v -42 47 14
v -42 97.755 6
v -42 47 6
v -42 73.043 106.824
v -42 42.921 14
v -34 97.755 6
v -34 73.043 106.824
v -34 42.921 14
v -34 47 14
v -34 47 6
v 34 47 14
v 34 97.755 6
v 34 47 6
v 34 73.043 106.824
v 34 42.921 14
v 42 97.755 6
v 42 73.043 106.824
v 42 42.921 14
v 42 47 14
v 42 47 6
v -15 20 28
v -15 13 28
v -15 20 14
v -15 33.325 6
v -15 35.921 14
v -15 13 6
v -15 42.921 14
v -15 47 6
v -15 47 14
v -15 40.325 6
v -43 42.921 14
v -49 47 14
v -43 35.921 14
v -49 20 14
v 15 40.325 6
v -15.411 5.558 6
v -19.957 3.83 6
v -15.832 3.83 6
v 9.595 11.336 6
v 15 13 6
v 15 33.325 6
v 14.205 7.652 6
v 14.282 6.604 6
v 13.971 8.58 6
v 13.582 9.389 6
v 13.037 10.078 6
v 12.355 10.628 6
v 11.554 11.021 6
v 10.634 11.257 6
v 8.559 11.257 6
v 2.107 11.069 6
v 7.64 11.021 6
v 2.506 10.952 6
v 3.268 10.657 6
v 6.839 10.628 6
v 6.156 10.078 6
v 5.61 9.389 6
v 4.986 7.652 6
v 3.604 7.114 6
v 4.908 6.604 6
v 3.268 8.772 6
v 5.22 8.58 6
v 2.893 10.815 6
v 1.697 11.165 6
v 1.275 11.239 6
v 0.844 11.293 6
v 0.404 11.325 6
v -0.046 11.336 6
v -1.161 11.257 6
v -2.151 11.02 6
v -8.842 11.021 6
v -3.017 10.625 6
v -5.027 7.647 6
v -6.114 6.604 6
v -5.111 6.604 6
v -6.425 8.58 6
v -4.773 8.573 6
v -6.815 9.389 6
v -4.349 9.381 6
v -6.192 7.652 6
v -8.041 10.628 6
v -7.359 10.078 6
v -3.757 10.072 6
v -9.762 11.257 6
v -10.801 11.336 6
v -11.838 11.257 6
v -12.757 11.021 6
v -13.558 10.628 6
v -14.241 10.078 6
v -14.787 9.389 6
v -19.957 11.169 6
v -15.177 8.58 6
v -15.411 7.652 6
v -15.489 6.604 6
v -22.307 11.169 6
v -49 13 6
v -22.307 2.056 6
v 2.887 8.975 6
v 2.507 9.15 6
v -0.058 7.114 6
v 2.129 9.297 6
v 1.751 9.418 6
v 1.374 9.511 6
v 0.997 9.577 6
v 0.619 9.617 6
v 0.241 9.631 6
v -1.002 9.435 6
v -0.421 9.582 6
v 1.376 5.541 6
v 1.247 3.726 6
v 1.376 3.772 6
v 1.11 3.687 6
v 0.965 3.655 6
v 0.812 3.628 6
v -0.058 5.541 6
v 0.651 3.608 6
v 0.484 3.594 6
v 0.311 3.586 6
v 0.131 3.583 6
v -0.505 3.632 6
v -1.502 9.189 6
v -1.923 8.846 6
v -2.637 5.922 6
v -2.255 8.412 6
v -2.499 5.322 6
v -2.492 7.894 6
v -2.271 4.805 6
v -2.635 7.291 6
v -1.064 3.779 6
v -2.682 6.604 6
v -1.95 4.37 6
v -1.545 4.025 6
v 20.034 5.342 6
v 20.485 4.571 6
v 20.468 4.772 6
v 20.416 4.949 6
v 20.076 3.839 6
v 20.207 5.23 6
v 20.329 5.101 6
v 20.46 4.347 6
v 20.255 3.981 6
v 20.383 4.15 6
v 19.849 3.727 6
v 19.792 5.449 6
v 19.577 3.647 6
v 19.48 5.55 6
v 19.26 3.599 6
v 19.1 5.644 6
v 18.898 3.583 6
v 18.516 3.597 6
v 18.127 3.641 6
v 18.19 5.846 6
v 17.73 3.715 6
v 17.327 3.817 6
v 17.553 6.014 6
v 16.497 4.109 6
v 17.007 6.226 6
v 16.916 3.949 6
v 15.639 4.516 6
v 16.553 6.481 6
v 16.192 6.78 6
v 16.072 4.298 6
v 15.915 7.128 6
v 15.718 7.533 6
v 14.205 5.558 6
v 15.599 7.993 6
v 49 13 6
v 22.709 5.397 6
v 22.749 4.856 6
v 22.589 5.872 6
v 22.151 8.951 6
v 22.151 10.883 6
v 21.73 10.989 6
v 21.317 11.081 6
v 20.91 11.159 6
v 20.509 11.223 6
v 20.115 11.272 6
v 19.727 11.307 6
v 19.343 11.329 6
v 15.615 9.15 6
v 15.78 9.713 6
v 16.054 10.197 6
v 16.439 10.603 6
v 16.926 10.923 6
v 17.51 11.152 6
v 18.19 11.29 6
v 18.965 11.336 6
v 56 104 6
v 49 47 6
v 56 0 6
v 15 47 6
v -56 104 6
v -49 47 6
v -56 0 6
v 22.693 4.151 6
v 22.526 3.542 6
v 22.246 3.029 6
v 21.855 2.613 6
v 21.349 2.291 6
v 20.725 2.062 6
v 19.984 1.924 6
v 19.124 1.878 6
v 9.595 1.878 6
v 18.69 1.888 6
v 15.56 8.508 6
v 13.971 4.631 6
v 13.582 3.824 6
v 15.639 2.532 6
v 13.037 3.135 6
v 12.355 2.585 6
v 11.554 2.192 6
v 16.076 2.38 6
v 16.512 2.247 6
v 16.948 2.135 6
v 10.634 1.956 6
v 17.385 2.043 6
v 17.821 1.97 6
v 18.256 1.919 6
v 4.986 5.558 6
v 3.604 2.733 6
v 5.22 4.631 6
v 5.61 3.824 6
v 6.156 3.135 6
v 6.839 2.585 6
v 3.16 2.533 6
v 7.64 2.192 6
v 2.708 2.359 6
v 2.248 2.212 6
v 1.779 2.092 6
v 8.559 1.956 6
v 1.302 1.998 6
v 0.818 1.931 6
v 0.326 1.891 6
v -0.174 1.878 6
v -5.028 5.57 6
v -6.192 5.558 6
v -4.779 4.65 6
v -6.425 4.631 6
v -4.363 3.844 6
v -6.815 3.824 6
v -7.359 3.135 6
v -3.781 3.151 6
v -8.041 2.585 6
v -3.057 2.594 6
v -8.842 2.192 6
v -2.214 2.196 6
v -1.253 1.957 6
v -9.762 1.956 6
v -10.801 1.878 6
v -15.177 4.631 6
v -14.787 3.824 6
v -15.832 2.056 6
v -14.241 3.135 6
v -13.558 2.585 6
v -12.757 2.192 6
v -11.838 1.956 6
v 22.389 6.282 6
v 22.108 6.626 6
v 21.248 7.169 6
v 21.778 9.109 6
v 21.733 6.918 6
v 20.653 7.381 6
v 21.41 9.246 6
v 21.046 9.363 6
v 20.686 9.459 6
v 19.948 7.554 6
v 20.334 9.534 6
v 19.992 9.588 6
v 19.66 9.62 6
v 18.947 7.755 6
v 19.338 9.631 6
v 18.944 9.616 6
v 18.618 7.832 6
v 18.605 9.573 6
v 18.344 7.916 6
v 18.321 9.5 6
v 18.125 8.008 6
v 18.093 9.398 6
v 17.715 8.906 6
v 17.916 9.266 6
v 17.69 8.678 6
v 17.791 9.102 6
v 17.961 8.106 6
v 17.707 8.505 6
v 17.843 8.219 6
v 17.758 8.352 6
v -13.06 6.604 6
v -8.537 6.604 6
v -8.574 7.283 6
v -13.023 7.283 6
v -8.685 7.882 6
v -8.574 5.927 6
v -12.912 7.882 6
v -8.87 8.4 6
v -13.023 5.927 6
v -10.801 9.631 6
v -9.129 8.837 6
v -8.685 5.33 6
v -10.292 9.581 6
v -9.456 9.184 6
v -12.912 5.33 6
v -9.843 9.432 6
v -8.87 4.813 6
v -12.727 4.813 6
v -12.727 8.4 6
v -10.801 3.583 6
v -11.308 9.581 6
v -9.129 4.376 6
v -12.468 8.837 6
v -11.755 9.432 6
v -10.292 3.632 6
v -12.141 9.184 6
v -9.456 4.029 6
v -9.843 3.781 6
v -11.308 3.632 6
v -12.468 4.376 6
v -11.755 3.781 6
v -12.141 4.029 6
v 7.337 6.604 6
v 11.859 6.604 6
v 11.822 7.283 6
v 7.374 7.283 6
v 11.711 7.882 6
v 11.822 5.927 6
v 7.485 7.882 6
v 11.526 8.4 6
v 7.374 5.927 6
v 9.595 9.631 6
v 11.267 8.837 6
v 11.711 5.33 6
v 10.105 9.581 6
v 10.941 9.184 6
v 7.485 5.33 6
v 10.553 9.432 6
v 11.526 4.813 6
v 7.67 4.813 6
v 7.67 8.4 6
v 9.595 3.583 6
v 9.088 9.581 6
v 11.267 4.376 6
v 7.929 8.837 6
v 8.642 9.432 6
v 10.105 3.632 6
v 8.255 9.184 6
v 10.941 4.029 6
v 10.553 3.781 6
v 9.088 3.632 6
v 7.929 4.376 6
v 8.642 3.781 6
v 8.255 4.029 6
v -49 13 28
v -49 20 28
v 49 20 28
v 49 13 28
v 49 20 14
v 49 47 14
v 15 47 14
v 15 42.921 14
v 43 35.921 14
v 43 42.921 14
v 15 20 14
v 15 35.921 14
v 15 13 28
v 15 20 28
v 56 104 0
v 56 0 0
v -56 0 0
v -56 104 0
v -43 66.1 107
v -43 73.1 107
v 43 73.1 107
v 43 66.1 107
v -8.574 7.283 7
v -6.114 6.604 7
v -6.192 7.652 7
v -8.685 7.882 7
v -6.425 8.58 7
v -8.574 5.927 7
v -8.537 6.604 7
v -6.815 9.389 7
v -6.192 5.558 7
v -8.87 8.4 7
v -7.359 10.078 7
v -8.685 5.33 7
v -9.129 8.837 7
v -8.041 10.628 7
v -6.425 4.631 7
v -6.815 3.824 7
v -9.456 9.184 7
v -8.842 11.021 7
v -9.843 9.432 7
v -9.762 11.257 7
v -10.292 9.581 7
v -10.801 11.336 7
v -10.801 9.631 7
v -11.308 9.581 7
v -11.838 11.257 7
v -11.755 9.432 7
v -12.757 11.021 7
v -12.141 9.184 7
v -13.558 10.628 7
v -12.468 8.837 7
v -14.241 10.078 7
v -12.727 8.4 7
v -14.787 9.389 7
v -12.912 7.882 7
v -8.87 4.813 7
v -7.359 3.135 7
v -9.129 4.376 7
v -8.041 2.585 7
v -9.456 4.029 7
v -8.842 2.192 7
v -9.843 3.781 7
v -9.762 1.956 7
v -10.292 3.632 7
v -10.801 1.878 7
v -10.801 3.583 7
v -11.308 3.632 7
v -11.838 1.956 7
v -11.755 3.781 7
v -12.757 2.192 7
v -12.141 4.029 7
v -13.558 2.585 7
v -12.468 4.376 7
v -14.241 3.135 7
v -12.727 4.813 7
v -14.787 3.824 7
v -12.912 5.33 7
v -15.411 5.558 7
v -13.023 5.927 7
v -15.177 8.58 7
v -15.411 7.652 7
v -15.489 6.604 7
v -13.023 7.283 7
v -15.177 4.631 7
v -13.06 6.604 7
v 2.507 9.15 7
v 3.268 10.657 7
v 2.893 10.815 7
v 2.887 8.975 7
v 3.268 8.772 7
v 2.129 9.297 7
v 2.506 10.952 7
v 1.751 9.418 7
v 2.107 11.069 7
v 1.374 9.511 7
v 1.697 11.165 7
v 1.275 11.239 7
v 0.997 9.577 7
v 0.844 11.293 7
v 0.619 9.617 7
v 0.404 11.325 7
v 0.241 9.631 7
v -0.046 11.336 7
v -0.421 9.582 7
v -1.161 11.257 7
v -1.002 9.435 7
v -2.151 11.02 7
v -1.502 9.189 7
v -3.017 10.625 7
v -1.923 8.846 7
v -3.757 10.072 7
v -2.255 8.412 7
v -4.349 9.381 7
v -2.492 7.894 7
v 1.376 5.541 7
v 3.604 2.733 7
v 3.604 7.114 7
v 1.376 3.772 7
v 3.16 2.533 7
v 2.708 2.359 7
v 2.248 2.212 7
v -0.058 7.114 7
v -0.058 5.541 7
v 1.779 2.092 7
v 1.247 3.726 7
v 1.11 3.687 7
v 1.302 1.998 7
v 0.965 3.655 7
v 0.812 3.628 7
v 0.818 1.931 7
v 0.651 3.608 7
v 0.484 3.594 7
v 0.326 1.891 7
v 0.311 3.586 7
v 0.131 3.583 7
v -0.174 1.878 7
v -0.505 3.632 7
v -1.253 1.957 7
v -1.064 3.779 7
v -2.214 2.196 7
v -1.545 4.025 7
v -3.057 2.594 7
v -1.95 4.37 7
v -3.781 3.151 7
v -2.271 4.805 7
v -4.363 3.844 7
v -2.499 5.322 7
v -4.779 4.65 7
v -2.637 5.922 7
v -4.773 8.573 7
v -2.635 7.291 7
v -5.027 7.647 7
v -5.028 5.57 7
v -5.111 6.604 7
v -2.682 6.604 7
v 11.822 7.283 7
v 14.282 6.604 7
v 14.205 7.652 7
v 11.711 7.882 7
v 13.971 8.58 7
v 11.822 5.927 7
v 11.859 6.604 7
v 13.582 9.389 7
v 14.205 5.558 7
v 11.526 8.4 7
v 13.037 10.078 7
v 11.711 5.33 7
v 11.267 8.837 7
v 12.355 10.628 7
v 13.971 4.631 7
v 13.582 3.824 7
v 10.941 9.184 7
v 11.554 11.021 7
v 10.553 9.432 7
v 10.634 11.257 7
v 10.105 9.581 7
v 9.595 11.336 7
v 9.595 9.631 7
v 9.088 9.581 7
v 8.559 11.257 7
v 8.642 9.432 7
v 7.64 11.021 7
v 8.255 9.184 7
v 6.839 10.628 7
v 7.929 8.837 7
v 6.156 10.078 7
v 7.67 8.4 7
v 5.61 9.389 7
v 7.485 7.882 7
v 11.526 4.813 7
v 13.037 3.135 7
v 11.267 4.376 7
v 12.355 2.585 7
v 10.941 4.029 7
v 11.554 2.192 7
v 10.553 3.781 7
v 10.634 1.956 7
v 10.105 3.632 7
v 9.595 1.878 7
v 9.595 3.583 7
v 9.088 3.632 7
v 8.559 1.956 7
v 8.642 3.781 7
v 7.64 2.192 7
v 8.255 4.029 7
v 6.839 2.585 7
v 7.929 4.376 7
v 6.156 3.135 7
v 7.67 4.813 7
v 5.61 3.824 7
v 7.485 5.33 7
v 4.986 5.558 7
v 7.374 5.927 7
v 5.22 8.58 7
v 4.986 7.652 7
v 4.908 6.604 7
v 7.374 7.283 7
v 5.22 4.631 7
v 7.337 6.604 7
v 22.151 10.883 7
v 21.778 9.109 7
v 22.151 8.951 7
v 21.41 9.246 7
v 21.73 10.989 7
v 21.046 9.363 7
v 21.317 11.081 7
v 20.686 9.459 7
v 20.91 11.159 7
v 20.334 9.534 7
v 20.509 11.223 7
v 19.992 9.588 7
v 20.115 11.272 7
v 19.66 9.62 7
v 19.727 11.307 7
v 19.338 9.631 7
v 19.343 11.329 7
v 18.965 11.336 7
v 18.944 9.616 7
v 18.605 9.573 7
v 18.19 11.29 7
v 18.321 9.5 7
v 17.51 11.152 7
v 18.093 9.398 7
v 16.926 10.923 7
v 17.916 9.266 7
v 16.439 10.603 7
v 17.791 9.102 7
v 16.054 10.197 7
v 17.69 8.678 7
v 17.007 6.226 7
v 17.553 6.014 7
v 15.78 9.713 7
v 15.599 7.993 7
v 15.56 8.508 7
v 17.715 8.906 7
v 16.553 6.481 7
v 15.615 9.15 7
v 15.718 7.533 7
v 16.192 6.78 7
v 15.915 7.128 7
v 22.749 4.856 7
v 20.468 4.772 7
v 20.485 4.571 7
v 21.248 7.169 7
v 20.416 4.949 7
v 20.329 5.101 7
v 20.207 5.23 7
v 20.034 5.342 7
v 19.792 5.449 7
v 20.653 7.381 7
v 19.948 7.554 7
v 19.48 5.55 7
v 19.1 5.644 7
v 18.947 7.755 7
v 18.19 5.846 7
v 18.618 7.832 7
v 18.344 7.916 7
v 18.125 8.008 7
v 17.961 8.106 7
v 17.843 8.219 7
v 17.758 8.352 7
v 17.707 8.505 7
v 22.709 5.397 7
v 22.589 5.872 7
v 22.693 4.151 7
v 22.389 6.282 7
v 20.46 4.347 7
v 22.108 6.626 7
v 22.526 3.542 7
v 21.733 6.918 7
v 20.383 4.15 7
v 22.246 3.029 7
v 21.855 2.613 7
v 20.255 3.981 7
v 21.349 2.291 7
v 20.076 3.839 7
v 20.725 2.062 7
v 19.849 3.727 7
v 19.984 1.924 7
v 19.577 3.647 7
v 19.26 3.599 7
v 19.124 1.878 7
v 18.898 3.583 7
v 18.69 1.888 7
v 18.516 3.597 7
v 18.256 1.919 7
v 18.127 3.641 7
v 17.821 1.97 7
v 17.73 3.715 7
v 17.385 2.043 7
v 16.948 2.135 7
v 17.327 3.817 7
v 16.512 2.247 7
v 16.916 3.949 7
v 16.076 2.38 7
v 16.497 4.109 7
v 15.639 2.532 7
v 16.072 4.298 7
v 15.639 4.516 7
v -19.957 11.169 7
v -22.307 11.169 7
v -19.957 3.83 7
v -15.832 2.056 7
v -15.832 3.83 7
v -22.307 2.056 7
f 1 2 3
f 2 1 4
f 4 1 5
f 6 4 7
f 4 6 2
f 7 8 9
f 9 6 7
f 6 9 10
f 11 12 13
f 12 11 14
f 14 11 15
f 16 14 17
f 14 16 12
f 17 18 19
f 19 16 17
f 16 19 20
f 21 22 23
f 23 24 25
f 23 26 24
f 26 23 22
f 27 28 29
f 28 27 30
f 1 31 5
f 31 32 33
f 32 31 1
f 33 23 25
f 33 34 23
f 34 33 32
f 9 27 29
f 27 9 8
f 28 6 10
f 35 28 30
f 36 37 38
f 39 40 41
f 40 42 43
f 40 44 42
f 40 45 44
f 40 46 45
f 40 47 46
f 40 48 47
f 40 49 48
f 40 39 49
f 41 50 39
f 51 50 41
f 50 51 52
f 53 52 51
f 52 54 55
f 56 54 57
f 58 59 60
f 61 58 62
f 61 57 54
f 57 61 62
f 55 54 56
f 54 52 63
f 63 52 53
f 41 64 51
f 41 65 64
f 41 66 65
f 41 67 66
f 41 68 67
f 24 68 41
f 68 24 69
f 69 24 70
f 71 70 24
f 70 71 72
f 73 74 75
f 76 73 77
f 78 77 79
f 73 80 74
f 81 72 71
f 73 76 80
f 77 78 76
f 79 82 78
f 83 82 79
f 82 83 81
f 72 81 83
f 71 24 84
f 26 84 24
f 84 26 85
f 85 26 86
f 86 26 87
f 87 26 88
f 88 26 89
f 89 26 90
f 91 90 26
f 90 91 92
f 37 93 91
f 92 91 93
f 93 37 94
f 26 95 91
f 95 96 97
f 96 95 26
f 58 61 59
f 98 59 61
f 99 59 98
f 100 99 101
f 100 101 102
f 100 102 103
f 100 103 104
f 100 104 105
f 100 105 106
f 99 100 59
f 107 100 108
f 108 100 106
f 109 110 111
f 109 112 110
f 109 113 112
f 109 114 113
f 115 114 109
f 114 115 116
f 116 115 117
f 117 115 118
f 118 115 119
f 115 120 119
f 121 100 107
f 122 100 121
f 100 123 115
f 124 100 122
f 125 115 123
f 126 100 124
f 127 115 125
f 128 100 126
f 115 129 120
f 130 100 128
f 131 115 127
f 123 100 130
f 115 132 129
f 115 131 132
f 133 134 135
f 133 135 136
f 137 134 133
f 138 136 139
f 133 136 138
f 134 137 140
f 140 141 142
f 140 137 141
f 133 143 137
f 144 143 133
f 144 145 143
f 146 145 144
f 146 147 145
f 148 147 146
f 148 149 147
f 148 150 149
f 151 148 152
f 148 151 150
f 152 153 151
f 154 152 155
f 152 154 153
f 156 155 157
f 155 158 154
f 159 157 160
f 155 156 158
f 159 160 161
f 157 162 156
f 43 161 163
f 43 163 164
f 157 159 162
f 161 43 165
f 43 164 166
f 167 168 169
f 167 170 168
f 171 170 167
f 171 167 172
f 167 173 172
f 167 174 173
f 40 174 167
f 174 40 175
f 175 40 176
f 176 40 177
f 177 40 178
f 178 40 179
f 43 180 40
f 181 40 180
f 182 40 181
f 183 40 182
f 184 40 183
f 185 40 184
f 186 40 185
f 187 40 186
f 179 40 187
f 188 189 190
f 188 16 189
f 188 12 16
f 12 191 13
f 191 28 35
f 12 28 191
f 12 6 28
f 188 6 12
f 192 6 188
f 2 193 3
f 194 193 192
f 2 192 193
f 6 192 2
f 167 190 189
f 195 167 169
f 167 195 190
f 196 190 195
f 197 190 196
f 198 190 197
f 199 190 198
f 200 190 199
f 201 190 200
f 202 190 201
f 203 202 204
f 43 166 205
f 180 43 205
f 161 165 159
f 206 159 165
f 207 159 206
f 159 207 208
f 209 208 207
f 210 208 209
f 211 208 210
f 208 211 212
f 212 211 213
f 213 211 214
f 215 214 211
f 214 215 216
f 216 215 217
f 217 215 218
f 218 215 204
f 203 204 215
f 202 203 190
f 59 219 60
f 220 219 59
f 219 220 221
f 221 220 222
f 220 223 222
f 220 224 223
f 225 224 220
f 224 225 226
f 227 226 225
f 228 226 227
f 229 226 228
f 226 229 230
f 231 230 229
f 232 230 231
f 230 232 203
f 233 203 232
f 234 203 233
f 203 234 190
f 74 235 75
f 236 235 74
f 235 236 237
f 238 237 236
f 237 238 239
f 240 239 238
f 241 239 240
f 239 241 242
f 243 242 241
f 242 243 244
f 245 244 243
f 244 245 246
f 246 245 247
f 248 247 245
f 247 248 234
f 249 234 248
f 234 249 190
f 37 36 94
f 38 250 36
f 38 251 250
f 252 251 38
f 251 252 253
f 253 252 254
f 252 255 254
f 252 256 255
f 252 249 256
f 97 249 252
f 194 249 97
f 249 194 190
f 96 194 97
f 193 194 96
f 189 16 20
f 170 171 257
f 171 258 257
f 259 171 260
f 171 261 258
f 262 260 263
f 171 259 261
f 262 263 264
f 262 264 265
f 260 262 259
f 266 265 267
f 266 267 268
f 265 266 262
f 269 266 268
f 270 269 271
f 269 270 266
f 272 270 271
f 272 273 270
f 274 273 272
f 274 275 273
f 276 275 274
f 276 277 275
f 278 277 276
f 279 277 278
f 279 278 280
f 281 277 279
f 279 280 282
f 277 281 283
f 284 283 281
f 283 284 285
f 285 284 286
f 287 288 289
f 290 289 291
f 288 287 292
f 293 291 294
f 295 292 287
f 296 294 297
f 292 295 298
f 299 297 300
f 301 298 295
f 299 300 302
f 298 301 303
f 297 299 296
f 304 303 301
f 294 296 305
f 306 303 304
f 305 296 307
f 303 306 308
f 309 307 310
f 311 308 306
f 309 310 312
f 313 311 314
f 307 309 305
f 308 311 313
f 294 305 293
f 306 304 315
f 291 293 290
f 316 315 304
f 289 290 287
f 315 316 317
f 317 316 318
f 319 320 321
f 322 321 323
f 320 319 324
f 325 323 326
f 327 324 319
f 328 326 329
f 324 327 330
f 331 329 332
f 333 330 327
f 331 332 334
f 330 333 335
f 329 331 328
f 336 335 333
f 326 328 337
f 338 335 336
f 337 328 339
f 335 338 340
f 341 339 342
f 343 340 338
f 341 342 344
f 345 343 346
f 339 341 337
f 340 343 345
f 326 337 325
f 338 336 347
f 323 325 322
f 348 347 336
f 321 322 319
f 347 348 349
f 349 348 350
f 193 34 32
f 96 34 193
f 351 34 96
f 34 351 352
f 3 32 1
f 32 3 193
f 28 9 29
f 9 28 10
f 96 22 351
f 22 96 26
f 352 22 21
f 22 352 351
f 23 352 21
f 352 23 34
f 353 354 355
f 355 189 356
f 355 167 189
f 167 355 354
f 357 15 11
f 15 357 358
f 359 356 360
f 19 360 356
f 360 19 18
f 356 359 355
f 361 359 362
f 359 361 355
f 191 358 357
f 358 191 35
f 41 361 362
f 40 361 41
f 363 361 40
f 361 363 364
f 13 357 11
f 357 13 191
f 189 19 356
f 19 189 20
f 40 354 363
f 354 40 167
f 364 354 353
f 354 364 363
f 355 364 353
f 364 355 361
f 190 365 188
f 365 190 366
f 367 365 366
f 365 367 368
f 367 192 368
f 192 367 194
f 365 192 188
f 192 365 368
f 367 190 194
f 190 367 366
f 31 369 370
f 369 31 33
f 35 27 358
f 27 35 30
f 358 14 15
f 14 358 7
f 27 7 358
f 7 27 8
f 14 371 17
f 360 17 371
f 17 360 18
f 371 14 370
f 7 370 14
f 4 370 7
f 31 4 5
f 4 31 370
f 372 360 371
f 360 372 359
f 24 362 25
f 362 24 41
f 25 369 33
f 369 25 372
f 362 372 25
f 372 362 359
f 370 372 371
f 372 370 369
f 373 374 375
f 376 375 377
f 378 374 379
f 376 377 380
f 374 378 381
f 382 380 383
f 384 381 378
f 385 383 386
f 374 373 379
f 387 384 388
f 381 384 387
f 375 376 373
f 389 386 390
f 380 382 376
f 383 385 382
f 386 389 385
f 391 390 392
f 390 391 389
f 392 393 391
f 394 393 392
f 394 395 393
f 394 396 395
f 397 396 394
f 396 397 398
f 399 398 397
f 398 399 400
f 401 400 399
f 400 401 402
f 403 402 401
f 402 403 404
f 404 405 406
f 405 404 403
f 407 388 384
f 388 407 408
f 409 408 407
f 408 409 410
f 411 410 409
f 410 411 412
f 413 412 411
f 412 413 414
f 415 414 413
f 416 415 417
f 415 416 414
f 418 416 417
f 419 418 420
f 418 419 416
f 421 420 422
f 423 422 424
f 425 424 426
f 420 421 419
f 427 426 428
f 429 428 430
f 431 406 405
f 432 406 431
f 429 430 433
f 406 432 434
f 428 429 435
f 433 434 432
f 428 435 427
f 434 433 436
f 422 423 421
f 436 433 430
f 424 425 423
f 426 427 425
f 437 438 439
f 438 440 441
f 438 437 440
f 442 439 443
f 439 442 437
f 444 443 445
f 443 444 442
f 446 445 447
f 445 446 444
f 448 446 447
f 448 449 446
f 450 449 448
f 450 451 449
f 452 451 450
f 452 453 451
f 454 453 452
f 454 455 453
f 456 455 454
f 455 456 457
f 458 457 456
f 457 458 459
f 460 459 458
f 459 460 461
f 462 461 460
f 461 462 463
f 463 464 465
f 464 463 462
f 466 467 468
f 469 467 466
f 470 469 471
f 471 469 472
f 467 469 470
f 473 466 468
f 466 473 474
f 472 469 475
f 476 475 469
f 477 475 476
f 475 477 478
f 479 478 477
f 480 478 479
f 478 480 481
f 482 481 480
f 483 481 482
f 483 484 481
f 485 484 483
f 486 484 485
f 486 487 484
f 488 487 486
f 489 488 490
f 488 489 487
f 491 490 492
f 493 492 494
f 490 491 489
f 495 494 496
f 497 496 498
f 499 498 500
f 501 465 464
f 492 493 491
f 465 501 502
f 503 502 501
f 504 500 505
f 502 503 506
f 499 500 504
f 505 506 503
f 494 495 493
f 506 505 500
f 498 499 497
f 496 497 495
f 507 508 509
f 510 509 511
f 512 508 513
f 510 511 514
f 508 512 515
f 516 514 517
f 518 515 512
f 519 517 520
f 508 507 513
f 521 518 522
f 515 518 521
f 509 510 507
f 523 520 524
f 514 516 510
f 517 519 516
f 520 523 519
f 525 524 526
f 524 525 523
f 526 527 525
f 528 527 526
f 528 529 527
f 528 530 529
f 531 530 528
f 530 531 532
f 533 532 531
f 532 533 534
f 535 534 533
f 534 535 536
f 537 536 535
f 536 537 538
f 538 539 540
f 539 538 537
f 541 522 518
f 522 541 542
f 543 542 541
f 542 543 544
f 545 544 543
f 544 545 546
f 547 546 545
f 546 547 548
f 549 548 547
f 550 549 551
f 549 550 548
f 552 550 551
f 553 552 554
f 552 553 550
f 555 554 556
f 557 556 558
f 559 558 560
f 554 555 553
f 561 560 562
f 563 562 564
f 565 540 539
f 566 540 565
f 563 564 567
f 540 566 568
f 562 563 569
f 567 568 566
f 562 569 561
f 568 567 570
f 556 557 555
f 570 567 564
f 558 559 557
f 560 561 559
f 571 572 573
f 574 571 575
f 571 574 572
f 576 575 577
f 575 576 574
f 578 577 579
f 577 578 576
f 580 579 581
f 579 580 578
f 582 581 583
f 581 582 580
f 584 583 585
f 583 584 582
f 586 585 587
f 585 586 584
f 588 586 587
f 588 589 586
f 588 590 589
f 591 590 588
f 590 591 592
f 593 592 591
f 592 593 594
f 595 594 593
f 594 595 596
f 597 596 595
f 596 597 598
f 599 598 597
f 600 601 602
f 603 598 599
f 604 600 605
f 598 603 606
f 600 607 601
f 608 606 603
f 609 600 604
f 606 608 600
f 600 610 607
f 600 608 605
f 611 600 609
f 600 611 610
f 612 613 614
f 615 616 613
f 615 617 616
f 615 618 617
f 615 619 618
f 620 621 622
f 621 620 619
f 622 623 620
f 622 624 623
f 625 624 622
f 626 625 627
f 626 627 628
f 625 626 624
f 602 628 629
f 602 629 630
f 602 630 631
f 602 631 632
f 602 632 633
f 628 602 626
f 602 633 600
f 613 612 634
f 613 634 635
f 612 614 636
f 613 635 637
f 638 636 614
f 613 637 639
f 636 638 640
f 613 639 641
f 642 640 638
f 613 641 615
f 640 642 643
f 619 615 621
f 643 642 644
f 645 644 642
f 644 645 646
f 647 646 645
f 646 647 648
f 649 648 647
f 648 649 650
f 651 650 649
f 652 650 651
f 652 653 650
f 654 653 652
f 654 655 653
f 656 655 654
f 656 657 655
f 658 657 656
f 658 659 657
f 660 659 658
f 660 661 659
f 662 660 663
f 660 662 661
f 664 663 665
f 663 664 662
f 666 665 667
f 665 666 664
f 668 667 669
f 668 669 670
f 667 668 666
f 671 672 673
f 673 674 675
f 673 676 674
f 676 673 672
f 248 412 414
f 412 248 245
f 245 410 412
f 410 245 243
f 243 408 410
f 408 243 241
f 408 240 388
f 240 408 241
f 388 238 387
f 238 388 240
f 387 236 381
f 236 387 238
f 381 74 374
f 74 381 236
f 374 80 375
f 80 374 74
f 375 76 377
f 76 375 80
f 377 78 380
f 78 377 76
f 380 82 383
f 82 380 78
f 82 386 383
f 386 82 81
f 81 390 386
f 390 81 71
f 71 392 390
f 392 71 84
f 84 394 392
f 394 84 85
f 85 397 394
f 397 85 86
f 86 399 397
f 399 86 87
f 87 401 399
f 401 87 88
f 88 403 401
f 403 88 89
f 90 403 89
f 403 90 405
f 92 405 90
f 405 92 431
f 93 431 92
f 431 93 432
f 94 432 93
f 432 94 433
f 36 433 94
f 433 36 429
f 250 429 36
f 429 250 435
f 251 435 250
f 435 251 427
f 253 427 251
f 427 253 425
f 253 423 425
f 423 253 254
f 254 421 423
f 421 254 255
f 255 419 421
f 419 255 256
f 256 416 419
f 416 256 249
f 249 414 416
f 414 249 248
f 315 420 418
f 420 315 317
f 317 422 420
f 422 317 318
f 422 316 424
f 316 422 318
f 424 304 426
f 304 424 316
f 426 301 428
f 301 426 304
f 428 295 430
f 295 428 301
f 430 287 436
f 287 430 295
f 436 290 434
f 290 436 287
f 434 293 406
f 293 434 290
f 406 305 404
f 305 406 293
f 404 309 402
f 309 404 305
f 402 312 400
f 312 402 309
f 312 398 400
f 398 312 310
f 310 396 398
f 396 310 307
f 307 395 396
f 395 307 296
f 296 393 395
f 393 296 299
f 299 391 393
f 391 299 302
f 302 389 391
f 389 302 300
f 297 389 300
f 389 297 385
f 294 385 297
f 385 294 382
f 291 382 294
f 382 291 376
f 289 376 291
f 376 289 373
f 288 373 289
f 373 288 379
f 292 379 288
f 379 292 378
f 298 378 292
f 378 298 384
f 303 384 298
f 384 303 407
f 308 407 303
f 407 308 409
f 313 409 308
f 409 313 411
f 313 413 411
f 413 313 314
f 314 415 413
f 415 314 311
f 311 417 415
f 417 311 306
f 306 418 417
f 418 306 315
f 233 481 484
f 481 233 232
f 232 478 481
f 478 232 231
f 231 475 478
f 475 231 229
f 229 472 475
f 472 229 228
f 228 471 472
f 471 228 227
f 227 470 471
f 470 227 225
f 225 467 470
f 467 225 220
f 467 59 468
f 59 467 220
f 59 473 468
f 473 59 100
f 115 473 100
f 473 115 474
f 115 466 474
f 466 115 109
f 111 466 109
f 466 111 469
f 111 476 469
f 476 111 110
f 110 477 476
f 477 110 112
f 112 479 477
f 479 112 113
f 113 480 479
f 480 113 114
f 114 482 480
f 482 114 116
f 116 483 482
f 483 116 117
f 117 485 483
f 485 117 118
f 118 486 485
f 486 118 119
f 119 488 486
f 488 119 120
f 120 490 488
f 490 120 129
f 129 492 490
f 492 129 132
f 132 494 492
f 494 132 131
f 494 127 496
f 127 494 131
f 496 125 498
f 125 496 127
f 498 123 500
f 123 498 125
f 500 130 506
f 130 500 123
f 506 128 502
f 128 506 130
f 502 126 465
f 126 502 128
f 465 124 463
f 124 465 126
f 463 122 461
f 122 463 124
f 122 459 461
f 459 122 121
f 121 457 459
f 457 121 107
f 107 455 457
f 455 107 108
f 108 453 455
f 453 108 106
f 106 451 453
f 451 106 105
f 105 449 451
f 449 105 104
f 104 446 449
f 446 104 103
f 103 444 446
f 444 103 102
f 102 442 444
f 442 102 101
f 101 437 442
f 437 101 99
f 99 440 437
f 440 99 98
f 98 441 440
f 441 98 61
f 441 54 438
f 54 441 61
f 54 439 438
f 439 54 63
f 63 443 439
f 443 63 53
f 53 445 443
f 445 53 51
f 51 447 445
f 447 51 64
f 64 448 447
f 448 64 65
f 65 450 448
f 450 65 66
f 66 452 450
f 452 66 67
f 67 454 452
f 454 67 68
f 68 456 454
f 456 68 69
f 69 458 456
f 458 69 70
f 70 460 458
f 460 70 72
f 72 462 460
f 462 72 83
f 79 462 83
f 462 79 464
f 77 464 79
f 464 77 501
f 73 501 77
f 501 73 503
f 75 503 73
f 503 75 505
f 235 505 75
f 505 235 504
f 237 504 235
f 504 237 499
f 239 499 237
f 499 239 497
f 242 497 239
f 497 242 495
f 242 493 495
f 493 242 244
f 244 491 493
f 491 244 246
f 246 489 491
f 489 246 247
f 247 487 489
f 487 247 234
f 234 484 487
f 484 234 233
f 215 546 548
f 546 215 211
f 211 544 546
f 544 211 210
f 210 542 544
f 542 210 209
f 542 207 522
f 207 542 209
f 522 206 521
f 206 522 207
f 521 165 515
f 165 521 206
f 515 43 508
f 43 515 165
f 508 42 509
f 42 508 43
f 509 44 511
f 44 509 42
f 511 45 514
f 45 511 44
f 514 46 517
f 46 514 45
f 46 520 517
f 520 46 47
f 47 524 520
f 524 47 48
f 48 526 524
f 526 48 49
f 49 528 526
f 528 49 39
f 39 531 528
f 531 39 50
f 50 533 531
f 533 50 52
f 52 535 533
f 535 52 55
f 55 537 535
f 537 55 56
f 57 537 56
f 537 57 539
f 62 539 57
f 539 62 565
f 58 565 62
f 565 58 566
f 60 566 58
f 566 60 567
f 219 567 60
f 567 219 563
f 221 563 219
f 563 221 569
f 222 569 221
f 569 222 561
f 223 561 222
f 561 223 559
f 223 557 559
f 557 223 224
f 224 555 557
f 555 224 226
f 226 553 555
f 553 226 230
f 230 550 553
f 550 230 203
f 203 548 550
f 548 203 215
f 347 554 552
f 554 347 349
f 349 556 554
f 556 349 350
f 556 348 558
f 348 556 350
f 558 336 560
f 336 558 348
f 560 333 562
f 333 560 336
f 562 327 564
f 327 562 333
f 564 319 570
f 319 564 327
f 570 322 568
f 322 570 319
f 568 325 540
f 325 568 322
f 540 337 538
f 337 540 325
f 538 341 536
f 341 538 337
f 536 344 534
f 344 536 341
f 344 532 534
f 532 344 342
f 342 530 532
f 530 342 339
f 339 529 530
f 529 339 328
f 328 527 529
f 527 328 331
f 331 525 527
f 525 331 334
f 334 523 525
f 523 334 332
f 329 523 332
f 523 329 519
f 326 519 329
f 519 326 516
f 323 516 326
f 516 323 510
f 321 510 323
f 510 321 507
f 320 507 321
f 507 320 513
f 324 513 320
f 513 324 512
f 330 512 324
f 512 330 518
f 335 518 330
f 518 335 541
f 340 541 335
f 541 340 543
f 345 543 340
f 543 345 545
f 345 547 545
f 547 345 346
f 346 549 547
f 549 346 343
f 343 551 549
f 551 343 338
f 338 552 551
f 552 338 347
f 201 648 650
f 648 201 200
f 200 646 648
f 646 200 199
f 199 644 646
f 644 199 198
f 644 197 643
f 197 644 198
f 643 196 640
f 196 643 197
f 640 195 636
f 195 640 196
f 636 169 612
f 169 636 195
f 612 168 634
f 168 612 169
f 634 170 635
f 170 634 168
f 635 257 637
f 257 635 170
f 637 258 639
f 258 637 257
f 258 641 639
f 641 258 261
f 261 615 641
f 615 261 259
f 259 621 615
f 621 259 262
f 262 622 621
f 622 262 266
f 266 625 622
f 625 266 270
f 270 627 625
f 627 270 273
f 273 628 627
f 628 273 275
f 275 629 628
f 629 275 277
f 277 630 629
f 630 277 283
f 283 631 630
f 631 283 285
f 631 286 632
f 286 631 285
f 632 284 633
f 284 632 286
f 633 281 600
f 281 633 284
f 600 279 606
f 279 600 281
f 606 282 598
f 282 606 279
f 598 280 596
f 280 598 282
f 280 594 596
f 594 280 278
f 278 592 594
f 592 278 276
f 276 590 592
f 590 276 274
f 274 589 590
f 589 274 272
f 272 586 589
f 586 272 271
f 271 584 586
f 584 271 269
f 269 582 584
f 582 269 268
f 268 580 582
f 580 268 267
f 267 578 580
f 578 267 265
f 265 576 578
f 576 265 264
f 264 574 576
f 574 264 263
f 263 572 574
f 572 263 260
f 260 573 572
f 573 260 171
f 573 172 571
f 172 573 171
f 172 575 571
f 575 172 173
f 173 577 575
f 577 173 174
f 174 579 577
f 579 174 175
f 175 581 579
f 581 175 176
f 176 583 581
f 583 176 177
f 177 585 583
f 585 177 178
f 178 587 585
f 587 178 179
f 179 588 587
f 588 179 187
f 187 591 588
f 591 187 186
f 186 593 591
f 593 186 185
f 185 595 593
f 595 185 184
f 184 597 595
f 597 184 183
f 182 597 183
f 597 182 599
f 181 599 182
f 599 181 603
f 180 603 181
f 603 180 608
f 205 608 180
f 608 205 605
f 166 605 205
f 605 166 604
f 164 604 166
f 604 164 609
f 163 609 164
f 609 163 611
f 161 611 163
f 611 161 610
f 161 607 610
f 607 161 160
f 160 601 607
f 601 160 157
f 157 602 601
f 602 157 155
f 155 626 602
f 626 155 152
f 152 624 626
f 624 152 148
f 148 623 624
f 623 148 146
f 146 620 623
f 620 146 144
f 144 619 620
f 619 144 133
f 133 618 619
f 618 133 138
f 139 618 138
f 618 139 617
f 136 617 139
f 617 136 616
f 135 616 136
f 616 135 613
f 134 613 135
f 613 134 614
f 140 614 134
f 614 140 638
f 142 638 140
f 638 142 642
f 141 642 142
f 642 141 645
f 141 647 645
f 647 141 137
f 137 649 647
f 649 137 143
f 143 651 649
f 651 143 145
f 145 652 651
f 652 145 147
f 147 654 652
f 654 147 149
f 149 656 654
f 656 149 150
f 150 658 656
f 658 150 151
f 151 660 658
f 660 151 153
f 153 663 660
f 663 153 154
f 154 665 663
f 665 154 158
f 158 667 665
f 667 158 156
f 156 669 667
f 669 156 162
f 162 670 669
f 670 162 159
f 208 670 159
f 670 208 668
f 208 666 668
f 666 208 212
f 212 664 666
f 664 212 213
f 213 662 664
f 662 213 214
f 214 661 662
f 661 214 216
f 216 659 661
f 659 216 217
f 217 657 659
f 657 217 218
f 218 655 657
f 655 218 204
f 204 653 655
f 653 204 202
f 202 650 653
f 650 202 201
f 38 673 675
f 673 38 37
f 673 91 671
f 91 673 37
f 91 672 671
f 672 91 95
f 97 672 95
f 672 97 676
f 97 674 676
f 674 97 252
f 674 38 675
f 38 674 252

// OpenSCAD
// Logos Redmi 9 Stand v3: one-piece desktop holder for Bambu A1 mini.
// Redmi 9 nominal: 163.32 x 77.01 x 9.1 mm (without case).
// Base flat on bed; X width, Y points backwards, Z up.
module yz_prism(profile,width,xstart) {
    translate([xstart,0,0])
    multmatrix([[0,0,1,0],[1,0,0,0],[0,1,0,0],[0,0,0,1]])
    linear_extrude(height=width) polygon(points=profile);
}
union() {
    translate([-56,0,0]) cube([112,104,6]);
    yz_prism([[33,5],[40,5],[73.1,107],[66.1,107]],86,-43);
    for (x=[-42,34])
        yz_prism([[39,5],[98,5],[73,107],[65,98]],8,x);
    for (x=[-49,15]) {
        translate([x,13,6]) cube([34,34,8]);
        translate([x,13,14]) cube([34,7,14]);
        yz_prism([[13,6],[47,6],[42,13],[20,13]],34,x);
    }
    translate([0,6.5,6]) linear_extrude(height=1)
        text("LOGOS",size=9,font="DejaVu Sans:style=Bold",halign="center",valign="center");
}
